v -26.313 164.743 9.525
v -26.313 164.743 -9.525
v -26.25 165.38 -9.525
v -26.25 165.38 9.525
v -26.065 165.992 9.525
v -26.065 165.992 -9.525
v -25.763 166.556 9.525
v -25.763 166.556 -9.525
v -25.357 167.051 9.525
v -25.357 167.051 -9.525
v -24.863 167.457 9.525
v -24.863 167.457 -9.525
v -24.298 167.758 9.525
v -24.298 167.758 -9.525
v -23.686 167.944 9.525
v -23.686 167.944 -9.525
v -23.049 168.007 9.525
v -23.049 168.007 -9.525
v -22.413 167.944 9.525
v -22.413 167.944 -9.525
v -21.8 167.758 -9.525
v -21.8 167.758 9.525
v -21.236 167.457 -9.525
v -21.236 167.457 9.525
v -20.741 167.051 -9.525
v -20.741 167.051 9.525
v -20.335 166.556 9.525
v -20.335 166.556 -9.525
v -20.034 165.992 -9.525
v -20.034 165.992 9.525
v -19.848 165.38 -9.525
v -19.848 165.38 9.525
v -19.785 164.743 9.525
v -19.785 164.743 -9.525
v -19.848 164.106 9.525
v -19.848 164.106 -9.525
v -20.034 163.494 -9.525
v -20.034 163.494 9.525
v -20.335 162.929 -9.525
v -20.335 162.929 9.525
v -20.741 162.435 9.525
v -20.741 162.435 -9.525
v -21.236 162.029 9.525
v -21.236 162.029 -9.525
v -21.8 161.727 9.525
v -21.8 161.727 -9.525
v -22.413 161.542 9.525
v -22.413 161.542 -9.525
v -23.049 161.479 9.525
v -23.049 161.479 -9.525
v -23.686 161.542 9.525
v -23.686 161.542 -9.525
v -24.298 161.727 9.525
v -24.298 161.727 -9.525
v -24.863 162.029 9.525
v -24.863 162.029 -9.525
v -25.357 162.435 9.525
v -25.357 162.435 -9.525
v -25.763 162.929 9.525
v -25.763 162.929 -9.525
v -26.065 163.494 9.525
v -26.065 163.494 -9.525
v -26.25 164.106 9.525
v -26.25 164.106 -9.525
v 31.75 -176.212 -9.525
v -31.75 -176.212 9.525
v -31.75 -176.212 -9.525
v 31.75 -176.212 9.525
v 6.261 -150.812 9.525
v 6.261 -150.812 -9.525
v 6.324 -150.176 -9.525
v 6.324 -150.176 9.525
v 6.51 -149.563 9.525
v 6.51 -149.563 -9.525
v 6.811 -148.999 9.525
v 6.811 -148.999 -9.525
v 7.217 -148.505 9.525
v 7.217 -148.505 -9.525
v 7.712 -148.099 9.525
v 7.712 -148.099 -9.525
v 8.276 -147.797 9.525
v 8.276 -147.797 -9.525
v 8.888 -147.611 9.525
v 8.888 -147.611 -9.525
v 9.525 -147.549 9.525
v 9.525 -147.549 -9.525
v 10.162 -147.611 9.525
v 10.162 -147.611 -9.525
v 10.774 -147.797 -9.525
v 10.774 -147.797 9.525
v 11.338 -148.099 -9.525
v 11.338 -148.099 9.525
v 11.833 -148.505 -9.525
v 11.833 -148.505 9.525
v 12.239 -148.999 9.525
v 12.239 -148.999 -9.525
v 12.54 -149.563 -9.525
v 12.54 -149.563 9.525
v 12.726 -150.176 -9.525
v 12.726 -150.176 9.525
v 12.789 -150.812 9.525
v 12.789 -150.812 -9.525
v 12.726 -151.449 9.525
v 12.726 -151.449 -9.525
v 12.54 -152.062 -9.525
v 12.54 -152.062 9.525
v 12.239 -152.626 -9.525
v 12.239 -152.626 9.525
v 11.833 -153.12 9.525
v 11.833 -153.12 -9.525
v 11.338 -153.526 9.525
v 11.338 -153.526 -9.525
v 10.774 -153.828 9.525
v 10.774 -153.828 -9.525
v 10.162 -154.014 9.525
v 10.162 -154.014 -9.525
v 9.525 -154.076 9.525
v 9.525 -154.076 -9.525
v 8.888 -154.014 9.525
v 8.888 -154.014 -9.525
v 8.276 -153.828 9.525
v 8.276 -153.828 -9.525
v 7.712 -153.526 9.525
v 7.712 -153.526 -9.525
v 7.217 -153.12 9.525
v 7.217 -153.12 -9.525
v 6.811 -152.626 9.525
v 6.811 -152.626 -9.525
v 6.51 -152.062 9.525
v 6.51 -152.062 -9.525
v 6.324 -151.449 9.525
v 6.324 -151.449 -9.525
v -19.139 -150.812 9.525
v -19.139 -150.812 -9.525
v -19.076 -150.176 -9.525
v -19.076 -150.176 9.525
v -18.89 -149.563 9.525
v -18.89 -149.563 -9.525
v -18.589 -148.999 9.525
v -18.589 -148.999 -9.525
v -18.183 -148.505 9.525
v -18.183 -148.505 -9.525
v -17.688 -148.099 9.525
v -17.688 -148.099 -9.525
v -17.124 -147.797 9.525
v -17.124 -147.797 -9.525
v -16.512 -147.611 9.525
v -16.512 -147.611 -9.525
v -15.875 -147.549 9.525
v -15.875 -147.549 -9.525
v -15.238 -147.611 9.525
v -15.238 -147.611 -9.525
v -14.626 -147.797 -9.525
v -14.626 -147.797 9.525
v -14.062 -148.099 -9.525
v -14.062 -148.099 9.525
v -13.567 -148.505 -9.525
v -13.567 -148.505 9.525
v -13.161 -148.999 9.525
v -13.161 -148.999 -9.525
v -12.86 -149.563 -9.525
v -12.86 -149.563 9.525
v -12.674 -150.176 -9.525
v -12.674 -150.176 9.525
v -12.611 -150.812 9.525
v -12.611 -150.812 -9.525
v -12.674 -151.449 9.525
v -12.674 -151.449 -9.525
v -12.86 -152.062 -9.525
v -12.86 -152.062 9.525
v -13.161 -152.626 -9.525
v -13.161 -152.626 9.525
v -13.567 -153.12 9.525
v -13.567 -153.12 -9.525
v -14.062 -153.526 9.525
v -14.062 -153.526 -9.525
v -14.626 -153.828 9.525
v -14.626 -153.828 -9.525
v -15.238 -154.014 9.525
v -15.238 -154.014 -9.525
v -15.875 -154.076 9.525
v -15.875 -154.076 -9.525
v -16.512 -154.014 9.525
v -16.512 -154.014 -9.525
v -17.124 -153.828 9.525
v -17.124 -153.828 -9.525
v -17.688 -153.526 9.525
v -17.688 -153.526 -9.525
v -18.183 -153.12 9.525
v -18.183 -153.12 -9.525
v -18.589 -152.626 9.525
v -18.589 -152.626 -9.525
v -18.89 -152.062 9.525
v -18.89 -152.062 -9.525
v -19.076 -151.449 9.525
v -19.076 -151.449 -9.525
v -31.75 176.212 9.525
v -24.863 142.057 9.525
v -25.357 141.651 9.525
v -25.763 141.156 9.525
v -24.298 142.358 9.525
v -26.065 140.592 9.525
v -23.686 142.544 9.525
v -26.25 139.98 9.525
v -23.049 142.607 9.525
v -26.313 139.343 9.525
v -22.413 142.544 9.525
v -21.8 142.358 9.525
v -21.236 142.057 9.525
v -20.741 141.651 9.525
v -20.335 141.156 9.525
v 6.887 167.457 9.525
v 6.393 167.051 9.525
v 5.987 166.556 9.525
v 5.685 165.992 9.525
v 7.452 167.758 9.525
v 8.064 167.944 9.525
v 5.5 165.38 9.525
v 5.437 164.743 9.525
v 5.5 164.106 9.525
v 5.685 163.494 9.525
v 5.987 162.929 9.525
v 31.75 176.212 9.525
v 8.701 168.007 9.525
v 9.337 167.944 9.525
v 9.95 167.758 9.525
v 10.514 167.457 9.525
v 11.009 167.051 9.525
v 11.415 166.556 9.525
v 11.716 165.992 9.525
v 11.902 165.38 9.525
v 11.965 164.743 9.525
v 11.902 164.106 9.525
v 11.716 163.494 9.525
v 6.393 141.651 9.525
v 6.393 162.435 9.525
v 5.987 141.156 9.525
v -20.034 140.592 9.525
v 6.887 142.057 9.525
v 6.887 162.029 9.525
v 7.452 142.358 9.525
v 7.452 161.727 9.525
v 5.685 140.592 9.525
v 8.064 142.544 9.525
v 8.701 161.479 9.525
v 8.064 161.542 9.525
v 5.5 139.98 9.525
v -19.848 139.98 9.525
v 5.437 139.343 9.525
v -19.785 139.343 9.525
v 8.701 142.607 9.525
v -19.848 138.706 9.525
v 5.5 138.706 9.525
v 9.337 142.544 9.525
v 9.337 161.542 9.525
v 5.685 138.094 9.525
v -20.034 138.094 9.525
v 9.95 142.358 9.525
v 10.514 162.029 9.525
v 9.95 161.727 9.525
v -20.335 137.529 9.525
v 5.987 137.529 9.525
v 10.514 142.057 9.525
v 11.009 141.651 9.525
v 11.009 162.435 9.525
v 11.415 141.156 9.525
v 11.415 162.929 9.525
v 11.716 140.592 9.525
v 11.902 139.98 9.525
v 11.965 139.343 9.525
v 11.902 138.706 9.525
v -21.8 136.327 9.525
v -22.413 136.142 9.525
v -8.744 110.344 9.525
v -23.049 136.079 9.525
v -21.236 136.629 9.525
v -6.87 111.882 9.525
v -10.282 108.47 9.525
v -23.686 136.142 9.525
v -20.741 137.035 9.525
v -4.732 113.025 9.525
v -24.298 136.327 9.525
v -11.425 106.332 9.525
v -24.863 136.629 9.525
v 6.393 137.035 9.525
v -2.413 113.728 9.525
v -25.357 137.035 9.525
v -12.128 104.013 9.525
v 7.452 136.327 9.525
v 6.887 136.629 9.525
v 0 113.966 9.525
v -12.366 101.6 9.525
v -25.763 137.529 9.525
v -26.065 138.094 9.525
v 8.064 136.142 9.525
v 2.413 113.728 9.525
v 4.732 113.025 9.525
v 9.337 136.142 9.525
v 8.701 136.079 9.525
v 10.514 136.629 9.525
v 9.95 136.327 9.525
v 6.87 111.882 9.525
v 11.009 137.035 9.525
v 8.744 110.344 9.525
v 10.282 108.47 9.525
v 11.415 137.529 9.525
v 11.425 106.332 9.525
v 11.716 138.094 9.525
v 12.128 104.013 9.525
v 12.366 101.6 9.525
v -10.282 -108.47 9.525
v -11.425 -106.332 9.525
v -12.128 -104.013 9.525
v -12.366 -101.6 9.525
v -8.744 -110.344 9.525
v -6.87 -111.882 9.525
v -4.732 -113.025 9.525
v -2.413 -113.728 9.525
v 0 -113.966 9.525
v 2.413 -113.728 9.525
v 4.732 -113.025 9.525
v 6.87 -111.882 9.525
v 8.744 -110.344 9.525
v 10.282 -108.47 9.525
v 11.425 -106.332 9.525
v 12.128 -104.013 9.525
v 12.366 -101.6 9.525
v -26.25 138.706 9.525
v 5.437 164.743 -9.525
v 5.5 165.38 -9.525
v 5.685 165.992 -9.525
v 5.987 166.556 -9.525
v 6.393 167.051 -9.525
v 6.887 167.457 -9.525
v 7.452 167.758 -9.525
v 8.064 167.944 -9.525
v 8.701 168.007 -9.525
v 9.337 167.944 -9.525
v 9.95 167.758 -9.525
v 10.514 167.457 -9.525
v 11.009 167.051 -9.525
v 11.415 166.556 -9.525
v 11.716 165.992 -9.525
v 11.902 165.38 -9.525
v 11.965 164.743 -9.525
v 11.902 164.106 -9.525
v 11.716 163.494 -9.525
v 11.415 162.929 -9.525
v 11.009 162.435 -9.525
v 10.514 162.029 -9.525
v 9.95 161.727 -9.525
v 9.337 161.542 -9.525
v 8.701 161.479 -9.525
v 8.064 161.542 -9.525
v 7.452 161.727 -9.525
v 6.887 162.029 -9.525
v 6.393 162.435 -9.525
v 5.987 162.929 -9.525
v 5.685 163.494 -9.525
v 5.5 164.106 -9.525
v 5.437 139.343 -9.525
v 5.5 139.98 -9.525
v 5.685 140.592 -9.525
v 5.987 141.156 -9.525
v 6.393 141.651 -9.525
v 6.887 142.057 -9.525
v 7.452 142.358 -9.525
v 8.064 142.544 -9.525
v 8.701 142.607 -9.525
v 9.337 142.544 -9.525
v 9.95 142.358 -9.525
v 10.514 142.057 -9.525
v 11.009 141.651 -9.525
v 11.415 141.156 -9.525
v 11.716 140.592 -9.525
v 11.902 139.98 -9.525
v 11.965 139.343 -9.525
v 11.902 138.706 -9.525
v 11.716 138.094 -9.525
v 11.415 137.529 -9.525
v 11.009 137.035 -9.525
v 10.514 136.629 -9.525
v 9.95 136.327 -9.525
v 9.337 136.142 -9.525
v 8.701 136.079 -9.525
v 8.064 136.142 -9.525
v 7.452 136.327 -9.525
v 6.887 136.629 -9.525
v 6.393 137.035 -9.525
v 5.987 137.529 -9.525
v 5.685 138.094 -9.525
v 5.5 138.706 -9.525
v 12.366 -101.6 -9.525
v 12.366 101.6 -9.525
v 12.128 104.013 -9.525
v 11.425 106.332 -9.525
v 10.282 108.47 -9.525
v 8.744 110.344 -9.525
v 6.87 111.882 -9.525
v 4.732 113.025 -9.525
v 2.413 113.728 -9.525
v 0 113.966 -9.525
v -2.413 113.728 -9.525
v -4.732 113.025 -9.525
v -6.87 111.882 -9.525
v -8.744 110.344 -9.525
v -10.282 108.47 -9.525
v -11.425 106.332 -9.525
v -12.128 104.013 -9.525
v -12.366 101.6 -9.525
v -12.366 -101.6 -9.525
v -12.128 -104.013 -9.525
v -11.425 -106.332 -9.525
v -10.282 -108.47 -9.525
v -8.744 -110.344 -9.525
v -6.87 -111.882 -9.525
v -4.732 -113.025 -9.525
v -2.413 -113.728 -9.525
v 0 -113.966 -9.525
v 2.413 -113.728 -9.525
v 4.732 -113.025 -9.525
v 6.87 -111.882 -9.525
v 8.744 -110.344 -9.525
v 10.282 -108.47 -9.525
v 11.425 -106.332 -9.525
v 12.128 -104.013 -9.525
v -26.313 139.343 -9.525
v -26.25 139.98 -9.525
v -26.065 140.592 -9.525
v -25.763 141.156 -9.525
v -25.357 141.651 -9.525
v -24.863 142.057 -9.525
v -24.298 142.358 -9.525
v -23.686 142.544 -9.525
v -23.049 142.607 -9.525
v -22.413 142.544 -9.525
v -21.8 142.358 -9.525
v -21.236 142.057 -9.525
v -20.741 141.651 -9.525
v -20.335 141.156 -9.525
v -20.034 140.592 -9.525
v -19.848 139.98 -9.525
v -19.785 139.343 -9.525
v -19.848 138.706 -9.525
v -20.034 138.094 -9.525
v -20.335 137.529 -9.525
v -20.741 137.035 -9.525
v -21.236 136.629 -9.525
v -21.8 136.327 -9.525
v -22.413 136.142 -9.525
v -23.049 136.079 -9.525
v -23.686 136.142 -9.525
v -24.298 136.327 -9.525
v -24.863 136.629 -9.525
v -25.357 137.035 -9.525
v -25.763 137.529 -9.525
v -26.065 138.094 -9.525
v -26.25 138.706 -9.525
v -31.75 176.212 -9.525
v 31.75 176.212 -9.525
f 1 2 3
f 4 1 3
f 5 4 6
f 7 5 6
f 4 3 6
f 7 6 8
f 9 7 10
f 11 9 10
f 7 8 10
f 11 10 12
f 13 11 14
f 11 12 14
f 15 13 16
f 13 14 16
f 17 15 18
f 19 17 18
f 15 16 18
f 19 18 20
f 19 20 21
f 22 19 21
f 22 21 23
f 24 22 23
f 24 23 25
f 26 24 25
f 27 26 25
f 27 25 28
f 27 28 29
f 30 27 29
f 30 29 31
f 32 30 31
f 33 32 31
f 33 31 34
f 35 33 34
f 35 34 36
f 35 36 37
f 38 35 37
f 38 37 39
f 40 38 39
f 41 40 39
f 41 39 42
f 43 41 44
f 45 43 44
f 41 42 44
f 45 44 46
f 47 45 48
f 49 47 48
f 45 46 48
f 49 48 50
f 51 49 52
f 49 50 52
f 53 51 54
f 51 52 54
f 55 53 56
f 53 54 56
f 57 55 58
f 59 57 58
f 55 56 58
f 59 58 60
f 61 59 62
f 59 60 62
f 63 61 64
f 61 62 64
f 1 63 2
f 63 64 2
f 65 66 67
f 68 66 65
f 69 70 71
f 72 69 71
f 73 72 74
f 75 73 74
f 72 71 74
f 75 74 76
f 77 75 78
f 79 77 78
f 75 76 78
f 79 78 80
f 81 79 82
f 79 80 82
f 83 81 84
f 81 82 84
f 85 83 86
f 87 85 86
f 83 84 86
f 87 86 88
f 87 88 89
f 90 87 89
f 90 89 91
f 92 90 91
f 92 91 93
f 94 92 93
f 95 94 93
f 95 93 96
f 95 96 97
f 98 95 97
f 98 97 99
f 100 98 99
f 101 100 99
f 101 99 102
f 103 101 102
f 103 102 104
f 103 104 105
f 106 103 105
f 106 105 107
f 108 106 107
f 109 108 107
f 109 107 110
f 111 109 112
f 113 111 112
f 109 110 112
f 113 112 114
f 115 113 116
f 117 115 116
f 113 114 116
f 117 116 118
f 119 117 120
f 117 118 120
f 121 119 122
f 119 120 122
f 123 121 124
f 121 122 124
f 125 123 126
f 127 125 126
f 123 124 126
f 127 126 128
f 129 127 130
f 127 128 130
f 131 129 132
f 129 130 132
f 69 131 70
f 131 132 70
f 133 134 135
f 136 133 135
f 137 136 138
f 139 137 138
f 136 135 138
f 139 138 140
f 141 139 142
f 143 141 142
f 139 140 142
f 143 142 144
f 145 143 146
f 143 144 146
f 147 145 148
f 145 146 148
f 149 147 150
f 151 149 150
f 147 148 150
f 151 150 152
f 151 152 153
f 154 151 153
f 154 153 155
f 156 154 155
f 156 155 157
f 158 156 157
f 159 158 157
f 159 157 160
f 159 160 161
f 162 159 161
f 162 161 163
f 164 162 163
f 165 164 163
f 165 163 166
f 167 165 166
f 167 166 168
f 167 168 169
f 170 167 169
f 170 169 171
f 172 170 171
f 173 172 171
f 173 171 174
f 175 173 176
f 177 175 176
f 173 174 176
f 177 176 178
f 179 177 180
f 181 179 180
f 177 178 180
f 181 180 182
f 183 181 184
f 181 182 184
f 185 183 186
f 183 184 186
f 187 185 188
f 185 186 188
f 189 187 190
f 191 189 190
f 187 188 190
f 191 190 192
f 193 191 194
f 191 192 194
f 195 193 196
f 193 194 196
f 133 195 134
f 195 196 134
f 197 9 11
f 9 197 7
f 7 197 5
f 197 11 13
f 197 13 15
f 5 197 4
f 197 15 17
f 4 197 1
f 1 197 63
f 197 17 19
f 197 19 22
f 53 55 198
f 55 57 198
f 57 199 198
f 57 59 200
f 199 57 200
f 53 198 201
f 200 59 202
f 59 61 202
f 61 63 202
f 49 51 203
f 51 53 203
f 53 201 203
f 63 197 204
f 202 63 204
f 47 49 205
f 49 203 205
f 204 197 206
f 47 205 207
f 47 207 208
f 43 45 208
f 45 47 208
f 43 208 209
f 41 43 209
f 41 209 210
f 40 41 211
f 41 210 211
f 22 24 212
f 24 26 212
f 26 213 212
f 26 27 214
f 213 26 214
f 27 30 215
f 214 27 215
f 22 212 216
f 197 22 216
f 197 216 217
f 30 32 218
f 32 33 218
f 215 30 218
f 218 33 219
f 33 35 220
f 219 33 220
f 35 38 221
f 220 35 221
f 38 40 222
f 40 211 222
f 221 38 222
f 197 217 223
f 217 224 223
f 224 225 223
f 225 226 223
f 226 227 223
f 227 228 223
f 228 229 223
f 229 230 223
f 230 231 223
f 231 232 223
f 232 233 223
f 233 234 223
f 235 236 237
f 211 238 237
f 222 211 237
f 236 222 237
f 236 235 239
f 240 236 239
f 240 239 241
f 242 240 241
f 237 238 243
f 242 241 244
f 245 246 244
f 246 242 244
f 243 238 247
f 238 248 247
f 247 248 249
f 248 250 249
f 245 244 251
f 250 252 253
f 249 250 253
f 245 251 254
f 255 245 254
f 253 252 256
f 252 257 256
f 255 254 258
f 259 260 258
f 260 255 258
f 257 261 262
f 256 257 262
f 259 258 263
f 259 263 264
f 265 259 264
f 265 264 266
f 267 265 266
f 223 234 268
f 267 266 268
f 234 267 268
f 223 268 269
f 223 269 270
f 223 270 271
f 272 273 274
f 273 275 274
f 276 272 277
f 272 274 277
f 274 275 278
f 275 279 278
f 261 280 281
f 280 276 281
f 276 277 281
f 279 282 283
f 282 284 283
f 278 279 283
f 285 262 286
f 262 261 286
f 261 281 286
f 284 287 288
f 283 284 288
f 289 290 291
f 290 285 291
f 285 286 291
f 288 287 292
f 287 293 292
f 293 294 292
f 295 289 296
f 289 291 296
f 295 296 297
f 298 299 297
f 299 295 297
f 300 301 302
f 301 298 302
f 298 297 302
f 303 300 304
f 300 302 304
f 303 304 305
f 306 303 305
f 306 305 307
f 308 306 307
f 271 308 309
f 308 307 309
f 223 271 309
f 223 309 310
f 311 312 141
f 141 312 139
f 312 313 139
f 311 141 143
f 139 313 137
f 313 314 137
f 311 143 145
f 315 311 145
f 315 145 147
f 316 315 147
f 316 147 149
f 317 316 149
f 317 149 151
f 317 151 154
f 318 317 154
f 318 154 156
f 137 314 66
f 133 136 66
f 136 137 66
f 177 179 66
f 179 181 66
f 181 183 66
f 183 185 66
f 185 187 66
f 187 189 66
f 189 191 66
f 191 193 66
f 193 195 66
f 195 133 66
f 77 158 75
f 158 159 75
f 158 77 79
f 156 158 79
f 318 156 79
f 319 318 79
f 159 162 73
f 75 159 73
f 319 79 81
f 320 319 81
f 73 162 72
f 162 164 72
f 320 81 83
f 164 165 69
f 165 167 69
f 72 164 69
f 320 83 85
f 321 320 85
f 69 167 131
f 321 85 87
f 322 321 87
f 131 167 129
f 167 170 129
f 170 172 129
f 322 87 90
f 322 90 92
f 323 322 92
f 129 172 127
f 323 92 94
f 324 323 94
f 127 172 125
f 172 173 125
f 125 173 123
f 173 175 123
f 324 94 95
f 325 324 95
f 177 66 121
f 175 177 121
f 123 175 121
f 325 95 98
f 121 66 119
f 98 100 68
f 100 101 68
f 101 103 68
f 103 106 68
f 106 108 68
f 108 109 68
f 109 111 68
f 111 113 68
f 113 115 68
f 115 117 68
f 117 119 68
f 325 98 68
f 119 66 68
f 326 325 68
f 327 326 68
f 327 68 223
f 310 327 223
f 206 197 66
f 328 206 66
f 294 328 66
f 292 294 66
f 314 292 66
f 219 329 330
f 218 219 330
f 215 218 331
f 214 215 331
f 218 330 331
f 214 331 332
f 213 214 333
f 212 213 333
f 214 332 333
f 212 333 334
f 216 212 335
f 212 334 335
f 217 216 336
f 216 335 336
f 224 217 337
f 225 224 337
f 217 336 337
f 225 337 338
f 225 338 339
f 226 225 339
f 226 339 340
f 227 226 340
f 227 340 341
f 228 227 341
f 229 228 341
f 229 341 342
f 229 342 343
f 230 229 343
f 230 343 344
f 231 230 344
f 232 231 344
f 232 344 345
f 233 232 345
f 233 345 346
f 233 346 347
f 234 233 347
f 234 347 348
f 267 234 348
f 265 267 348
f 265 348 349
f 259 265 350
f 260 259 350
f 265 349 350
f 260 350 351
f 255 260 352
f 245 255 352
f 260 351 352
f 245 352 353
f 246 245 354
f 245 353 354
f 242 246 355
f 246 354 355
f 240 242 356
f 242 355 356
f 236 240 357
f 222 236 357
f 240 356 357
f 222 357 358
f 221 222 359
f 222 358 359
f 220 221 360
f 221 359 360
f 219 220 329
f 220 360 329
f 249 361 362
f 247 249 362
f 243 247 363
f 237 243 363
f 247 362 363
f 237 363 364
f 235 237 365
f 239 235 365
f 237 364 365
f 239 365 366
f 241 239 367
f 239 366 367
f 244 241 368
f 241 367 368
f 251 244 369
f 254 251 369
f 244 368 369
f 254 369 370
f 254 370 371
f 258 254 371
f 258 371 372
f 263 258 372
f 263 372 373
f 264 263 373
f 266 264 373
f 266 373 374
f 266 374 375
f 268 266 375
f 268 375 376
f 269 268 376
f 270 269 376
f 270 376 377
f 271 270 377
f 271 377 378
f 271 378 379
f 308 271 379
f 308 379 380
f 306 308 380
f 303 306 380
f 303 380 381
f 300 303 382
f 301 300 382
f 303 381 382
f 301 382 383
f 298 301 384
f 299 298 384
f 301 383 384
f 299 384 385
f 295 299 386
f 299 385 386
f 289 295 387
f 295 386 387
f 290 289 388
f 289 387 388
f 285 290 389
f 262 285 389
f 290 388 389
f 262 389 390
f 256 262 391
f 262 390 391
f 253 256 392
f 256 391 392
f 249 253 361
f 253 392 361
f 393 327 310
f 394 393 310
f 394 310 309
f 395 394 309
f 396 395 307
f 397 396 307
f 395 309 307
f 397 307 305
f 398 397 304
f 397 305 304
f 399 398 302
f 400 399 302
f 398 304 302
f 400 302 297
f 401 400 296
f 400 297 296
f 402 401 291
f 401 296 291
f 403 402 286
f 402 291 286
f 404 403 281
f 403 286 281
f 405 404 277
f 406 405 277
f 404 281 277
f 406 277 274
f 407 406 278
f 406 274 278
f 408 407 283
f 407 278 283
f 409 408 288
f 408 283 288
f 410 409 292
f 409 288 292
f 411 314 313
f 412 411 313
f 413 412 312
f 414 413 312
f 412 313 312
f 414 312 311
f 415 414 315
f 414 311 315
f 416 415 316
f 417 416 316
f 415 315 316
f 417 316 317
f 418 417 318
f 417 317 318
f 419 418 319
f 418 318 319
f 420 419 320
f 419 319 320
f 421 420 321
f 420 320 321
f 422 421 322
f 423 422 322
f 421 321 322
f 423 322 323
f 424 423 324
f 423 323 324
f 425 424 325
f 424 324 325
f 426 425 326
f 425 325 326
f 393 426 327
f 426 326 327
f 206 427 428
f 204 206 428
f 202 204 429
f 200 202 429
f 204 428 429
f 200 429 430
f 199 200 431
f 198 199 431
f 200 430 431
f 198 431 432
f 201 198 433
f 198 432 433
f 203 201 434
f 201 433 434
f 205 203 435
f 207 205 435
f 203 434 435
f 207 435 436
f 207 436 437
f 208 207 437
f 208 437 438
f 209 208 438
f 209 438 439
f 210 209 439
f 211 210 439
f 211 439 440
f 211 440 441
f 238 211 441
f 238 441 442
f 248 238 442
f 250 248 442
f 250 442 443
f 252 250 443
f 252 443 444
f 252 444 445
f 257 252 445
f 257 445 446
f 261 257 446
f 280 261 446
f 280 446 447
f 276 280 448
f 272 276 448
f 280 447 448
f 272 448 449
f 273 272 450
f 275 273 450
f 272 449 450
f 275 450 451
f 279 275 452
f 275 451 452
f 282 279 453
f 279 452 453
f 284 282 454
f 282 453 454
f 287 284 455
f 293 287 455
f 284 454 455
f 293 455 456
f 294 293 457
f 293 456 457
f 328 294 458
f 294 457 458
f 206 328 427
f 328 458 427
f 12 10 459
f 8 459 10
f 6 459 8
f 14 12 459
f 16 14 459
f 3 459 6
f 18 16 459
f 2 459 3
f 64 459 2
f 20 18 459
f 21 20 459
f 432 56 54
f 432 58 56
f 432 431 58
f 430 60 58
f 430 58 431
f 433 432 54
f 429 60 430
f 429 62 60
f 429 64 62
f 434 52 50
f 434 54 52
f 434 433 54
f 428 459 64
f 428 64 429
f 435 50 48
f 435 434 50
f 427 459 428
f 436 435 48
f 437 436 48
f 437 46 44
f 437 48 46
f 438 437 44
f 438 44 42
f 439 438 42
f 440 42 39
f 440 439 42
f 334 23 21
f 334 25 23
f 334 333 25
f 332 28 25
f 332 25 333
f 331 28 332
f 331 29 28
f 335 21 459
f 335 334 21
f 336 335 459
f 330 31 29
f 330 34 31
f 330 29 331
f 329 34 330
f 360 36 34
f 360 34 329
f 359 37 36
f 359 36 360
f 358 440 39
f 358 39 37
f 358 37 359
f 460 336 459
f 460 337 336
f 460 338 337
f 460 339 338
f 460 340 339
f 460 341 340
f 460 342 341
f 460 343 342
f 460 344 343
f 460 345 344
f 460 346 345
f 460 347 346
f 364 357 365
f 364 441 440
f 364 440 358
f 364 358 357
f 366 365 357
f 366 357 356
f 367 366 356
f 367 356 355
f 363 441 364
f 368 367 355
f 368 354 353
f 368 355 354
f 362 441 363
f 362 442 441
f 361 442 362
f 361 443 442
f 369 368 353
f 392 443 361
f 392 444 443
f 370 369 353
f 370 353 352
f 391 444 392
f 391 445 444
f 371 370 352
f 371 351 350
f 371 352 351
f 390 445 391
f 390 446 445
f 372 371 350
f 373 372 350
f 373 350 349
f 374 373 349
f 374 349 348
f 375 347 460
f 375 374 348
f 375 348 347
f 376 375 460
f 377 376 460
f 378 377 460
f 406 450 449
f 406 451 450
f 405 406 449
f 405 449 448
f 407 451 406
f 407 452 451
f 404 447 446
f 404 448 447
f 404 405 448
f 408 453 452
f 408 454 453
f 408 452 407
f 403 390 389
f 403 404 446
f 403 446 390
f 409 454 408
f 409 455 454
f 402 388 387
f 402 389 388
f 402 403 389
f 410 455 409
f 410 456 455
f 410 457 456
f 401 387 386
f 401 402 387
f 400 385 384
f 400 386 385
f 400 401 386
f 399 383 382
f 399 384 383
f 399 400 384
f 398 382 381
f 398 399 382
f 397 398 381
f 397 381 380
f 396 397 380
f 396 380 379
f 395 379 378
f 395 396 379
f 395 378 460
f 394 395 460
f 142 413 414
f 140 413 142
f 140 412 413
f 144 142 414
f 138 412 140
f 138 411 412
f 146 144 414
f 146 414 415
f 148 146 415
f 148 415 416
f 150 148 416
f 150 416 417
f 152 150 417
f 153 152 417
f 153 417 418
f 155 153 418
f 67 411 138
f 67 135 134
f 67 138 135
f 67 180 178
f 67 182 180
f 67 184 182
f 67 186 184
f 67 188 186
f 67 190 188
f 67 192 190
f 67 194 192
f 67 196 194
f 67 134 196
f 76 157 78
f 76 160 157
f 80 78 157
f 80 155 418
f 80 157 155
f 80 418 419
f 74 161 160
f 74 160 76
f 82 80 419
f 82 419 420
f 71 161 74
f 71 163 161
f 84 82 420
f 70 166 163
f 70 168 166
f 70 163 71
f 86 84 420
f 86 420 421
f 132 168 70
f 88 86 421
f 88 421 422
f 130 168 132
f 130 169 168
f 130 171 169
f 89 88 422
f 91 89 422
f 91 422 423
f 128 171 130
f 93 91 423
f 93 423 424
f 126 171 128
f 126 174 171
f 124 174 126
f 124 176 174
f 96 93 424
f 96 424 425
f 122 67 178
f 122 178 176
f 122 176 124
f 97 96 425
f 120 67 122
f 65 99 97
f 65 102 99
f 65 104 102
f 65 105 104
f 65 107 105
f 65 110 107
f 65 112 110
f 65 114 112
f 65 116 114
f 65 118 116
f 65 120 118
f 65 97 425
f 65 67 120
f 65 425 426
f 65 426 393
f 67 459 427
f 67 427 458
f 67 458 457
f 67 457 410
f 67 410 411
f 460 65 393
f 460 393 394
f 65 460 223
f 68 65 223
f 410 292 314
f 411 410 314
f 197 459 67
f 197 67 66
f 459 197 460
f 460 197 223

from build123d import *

# Parameters (mm, degrees)
F0_W     = 63.5
F0_H     = 19.05
F1_DEPTH = 176.2125
F3_D     = 6.5278
F5_DEPTH = 19.051


with BuildPart() as f1:
    # F0 (on Front) → F1 (new body, symmetric)
    with BuildSketch(Plane.XZ):
        Rectangle(F0_W, F0_H)
    extrude(amount=F1_DEPTH, both=True)

    # F3 (through all)
    with Locations(Plane.XY.offset(9.525)):
        with Locations((8.7006882876, 164.7427699804), (8.7006882876, 139.3427699804), (-23.0493117124, 139.3427699804), (-23.0493117124, 164.7427699804), (-15.875, -150.8125), (9.525, -150.8125)):
            Hole(F3_D / 2)

    # F4 (on face) → F5 (cut, through all)
    with BuildSketch(Plane.XY.offset(9.525)):
        with BuildLine():
            Line((-12.3660704418, 101.6), (-12.3660704418, -101.6))
            ThreePointArc((-12.3660704418, -101.6), (0, -113.9660704418), (12.3660704418, -101.6))
            Line((12.3660704418, -101.6), (12.3660704418, 101.6))
            ThreePointArc((12.3660704418, 101.6), (0, 113.9660704418), (-12.3660704418, 101.6))
        make_face()
    extrude(amount=-F5_DEPTH, mode=Mode.SUBTRACT)


solid = f1.part
